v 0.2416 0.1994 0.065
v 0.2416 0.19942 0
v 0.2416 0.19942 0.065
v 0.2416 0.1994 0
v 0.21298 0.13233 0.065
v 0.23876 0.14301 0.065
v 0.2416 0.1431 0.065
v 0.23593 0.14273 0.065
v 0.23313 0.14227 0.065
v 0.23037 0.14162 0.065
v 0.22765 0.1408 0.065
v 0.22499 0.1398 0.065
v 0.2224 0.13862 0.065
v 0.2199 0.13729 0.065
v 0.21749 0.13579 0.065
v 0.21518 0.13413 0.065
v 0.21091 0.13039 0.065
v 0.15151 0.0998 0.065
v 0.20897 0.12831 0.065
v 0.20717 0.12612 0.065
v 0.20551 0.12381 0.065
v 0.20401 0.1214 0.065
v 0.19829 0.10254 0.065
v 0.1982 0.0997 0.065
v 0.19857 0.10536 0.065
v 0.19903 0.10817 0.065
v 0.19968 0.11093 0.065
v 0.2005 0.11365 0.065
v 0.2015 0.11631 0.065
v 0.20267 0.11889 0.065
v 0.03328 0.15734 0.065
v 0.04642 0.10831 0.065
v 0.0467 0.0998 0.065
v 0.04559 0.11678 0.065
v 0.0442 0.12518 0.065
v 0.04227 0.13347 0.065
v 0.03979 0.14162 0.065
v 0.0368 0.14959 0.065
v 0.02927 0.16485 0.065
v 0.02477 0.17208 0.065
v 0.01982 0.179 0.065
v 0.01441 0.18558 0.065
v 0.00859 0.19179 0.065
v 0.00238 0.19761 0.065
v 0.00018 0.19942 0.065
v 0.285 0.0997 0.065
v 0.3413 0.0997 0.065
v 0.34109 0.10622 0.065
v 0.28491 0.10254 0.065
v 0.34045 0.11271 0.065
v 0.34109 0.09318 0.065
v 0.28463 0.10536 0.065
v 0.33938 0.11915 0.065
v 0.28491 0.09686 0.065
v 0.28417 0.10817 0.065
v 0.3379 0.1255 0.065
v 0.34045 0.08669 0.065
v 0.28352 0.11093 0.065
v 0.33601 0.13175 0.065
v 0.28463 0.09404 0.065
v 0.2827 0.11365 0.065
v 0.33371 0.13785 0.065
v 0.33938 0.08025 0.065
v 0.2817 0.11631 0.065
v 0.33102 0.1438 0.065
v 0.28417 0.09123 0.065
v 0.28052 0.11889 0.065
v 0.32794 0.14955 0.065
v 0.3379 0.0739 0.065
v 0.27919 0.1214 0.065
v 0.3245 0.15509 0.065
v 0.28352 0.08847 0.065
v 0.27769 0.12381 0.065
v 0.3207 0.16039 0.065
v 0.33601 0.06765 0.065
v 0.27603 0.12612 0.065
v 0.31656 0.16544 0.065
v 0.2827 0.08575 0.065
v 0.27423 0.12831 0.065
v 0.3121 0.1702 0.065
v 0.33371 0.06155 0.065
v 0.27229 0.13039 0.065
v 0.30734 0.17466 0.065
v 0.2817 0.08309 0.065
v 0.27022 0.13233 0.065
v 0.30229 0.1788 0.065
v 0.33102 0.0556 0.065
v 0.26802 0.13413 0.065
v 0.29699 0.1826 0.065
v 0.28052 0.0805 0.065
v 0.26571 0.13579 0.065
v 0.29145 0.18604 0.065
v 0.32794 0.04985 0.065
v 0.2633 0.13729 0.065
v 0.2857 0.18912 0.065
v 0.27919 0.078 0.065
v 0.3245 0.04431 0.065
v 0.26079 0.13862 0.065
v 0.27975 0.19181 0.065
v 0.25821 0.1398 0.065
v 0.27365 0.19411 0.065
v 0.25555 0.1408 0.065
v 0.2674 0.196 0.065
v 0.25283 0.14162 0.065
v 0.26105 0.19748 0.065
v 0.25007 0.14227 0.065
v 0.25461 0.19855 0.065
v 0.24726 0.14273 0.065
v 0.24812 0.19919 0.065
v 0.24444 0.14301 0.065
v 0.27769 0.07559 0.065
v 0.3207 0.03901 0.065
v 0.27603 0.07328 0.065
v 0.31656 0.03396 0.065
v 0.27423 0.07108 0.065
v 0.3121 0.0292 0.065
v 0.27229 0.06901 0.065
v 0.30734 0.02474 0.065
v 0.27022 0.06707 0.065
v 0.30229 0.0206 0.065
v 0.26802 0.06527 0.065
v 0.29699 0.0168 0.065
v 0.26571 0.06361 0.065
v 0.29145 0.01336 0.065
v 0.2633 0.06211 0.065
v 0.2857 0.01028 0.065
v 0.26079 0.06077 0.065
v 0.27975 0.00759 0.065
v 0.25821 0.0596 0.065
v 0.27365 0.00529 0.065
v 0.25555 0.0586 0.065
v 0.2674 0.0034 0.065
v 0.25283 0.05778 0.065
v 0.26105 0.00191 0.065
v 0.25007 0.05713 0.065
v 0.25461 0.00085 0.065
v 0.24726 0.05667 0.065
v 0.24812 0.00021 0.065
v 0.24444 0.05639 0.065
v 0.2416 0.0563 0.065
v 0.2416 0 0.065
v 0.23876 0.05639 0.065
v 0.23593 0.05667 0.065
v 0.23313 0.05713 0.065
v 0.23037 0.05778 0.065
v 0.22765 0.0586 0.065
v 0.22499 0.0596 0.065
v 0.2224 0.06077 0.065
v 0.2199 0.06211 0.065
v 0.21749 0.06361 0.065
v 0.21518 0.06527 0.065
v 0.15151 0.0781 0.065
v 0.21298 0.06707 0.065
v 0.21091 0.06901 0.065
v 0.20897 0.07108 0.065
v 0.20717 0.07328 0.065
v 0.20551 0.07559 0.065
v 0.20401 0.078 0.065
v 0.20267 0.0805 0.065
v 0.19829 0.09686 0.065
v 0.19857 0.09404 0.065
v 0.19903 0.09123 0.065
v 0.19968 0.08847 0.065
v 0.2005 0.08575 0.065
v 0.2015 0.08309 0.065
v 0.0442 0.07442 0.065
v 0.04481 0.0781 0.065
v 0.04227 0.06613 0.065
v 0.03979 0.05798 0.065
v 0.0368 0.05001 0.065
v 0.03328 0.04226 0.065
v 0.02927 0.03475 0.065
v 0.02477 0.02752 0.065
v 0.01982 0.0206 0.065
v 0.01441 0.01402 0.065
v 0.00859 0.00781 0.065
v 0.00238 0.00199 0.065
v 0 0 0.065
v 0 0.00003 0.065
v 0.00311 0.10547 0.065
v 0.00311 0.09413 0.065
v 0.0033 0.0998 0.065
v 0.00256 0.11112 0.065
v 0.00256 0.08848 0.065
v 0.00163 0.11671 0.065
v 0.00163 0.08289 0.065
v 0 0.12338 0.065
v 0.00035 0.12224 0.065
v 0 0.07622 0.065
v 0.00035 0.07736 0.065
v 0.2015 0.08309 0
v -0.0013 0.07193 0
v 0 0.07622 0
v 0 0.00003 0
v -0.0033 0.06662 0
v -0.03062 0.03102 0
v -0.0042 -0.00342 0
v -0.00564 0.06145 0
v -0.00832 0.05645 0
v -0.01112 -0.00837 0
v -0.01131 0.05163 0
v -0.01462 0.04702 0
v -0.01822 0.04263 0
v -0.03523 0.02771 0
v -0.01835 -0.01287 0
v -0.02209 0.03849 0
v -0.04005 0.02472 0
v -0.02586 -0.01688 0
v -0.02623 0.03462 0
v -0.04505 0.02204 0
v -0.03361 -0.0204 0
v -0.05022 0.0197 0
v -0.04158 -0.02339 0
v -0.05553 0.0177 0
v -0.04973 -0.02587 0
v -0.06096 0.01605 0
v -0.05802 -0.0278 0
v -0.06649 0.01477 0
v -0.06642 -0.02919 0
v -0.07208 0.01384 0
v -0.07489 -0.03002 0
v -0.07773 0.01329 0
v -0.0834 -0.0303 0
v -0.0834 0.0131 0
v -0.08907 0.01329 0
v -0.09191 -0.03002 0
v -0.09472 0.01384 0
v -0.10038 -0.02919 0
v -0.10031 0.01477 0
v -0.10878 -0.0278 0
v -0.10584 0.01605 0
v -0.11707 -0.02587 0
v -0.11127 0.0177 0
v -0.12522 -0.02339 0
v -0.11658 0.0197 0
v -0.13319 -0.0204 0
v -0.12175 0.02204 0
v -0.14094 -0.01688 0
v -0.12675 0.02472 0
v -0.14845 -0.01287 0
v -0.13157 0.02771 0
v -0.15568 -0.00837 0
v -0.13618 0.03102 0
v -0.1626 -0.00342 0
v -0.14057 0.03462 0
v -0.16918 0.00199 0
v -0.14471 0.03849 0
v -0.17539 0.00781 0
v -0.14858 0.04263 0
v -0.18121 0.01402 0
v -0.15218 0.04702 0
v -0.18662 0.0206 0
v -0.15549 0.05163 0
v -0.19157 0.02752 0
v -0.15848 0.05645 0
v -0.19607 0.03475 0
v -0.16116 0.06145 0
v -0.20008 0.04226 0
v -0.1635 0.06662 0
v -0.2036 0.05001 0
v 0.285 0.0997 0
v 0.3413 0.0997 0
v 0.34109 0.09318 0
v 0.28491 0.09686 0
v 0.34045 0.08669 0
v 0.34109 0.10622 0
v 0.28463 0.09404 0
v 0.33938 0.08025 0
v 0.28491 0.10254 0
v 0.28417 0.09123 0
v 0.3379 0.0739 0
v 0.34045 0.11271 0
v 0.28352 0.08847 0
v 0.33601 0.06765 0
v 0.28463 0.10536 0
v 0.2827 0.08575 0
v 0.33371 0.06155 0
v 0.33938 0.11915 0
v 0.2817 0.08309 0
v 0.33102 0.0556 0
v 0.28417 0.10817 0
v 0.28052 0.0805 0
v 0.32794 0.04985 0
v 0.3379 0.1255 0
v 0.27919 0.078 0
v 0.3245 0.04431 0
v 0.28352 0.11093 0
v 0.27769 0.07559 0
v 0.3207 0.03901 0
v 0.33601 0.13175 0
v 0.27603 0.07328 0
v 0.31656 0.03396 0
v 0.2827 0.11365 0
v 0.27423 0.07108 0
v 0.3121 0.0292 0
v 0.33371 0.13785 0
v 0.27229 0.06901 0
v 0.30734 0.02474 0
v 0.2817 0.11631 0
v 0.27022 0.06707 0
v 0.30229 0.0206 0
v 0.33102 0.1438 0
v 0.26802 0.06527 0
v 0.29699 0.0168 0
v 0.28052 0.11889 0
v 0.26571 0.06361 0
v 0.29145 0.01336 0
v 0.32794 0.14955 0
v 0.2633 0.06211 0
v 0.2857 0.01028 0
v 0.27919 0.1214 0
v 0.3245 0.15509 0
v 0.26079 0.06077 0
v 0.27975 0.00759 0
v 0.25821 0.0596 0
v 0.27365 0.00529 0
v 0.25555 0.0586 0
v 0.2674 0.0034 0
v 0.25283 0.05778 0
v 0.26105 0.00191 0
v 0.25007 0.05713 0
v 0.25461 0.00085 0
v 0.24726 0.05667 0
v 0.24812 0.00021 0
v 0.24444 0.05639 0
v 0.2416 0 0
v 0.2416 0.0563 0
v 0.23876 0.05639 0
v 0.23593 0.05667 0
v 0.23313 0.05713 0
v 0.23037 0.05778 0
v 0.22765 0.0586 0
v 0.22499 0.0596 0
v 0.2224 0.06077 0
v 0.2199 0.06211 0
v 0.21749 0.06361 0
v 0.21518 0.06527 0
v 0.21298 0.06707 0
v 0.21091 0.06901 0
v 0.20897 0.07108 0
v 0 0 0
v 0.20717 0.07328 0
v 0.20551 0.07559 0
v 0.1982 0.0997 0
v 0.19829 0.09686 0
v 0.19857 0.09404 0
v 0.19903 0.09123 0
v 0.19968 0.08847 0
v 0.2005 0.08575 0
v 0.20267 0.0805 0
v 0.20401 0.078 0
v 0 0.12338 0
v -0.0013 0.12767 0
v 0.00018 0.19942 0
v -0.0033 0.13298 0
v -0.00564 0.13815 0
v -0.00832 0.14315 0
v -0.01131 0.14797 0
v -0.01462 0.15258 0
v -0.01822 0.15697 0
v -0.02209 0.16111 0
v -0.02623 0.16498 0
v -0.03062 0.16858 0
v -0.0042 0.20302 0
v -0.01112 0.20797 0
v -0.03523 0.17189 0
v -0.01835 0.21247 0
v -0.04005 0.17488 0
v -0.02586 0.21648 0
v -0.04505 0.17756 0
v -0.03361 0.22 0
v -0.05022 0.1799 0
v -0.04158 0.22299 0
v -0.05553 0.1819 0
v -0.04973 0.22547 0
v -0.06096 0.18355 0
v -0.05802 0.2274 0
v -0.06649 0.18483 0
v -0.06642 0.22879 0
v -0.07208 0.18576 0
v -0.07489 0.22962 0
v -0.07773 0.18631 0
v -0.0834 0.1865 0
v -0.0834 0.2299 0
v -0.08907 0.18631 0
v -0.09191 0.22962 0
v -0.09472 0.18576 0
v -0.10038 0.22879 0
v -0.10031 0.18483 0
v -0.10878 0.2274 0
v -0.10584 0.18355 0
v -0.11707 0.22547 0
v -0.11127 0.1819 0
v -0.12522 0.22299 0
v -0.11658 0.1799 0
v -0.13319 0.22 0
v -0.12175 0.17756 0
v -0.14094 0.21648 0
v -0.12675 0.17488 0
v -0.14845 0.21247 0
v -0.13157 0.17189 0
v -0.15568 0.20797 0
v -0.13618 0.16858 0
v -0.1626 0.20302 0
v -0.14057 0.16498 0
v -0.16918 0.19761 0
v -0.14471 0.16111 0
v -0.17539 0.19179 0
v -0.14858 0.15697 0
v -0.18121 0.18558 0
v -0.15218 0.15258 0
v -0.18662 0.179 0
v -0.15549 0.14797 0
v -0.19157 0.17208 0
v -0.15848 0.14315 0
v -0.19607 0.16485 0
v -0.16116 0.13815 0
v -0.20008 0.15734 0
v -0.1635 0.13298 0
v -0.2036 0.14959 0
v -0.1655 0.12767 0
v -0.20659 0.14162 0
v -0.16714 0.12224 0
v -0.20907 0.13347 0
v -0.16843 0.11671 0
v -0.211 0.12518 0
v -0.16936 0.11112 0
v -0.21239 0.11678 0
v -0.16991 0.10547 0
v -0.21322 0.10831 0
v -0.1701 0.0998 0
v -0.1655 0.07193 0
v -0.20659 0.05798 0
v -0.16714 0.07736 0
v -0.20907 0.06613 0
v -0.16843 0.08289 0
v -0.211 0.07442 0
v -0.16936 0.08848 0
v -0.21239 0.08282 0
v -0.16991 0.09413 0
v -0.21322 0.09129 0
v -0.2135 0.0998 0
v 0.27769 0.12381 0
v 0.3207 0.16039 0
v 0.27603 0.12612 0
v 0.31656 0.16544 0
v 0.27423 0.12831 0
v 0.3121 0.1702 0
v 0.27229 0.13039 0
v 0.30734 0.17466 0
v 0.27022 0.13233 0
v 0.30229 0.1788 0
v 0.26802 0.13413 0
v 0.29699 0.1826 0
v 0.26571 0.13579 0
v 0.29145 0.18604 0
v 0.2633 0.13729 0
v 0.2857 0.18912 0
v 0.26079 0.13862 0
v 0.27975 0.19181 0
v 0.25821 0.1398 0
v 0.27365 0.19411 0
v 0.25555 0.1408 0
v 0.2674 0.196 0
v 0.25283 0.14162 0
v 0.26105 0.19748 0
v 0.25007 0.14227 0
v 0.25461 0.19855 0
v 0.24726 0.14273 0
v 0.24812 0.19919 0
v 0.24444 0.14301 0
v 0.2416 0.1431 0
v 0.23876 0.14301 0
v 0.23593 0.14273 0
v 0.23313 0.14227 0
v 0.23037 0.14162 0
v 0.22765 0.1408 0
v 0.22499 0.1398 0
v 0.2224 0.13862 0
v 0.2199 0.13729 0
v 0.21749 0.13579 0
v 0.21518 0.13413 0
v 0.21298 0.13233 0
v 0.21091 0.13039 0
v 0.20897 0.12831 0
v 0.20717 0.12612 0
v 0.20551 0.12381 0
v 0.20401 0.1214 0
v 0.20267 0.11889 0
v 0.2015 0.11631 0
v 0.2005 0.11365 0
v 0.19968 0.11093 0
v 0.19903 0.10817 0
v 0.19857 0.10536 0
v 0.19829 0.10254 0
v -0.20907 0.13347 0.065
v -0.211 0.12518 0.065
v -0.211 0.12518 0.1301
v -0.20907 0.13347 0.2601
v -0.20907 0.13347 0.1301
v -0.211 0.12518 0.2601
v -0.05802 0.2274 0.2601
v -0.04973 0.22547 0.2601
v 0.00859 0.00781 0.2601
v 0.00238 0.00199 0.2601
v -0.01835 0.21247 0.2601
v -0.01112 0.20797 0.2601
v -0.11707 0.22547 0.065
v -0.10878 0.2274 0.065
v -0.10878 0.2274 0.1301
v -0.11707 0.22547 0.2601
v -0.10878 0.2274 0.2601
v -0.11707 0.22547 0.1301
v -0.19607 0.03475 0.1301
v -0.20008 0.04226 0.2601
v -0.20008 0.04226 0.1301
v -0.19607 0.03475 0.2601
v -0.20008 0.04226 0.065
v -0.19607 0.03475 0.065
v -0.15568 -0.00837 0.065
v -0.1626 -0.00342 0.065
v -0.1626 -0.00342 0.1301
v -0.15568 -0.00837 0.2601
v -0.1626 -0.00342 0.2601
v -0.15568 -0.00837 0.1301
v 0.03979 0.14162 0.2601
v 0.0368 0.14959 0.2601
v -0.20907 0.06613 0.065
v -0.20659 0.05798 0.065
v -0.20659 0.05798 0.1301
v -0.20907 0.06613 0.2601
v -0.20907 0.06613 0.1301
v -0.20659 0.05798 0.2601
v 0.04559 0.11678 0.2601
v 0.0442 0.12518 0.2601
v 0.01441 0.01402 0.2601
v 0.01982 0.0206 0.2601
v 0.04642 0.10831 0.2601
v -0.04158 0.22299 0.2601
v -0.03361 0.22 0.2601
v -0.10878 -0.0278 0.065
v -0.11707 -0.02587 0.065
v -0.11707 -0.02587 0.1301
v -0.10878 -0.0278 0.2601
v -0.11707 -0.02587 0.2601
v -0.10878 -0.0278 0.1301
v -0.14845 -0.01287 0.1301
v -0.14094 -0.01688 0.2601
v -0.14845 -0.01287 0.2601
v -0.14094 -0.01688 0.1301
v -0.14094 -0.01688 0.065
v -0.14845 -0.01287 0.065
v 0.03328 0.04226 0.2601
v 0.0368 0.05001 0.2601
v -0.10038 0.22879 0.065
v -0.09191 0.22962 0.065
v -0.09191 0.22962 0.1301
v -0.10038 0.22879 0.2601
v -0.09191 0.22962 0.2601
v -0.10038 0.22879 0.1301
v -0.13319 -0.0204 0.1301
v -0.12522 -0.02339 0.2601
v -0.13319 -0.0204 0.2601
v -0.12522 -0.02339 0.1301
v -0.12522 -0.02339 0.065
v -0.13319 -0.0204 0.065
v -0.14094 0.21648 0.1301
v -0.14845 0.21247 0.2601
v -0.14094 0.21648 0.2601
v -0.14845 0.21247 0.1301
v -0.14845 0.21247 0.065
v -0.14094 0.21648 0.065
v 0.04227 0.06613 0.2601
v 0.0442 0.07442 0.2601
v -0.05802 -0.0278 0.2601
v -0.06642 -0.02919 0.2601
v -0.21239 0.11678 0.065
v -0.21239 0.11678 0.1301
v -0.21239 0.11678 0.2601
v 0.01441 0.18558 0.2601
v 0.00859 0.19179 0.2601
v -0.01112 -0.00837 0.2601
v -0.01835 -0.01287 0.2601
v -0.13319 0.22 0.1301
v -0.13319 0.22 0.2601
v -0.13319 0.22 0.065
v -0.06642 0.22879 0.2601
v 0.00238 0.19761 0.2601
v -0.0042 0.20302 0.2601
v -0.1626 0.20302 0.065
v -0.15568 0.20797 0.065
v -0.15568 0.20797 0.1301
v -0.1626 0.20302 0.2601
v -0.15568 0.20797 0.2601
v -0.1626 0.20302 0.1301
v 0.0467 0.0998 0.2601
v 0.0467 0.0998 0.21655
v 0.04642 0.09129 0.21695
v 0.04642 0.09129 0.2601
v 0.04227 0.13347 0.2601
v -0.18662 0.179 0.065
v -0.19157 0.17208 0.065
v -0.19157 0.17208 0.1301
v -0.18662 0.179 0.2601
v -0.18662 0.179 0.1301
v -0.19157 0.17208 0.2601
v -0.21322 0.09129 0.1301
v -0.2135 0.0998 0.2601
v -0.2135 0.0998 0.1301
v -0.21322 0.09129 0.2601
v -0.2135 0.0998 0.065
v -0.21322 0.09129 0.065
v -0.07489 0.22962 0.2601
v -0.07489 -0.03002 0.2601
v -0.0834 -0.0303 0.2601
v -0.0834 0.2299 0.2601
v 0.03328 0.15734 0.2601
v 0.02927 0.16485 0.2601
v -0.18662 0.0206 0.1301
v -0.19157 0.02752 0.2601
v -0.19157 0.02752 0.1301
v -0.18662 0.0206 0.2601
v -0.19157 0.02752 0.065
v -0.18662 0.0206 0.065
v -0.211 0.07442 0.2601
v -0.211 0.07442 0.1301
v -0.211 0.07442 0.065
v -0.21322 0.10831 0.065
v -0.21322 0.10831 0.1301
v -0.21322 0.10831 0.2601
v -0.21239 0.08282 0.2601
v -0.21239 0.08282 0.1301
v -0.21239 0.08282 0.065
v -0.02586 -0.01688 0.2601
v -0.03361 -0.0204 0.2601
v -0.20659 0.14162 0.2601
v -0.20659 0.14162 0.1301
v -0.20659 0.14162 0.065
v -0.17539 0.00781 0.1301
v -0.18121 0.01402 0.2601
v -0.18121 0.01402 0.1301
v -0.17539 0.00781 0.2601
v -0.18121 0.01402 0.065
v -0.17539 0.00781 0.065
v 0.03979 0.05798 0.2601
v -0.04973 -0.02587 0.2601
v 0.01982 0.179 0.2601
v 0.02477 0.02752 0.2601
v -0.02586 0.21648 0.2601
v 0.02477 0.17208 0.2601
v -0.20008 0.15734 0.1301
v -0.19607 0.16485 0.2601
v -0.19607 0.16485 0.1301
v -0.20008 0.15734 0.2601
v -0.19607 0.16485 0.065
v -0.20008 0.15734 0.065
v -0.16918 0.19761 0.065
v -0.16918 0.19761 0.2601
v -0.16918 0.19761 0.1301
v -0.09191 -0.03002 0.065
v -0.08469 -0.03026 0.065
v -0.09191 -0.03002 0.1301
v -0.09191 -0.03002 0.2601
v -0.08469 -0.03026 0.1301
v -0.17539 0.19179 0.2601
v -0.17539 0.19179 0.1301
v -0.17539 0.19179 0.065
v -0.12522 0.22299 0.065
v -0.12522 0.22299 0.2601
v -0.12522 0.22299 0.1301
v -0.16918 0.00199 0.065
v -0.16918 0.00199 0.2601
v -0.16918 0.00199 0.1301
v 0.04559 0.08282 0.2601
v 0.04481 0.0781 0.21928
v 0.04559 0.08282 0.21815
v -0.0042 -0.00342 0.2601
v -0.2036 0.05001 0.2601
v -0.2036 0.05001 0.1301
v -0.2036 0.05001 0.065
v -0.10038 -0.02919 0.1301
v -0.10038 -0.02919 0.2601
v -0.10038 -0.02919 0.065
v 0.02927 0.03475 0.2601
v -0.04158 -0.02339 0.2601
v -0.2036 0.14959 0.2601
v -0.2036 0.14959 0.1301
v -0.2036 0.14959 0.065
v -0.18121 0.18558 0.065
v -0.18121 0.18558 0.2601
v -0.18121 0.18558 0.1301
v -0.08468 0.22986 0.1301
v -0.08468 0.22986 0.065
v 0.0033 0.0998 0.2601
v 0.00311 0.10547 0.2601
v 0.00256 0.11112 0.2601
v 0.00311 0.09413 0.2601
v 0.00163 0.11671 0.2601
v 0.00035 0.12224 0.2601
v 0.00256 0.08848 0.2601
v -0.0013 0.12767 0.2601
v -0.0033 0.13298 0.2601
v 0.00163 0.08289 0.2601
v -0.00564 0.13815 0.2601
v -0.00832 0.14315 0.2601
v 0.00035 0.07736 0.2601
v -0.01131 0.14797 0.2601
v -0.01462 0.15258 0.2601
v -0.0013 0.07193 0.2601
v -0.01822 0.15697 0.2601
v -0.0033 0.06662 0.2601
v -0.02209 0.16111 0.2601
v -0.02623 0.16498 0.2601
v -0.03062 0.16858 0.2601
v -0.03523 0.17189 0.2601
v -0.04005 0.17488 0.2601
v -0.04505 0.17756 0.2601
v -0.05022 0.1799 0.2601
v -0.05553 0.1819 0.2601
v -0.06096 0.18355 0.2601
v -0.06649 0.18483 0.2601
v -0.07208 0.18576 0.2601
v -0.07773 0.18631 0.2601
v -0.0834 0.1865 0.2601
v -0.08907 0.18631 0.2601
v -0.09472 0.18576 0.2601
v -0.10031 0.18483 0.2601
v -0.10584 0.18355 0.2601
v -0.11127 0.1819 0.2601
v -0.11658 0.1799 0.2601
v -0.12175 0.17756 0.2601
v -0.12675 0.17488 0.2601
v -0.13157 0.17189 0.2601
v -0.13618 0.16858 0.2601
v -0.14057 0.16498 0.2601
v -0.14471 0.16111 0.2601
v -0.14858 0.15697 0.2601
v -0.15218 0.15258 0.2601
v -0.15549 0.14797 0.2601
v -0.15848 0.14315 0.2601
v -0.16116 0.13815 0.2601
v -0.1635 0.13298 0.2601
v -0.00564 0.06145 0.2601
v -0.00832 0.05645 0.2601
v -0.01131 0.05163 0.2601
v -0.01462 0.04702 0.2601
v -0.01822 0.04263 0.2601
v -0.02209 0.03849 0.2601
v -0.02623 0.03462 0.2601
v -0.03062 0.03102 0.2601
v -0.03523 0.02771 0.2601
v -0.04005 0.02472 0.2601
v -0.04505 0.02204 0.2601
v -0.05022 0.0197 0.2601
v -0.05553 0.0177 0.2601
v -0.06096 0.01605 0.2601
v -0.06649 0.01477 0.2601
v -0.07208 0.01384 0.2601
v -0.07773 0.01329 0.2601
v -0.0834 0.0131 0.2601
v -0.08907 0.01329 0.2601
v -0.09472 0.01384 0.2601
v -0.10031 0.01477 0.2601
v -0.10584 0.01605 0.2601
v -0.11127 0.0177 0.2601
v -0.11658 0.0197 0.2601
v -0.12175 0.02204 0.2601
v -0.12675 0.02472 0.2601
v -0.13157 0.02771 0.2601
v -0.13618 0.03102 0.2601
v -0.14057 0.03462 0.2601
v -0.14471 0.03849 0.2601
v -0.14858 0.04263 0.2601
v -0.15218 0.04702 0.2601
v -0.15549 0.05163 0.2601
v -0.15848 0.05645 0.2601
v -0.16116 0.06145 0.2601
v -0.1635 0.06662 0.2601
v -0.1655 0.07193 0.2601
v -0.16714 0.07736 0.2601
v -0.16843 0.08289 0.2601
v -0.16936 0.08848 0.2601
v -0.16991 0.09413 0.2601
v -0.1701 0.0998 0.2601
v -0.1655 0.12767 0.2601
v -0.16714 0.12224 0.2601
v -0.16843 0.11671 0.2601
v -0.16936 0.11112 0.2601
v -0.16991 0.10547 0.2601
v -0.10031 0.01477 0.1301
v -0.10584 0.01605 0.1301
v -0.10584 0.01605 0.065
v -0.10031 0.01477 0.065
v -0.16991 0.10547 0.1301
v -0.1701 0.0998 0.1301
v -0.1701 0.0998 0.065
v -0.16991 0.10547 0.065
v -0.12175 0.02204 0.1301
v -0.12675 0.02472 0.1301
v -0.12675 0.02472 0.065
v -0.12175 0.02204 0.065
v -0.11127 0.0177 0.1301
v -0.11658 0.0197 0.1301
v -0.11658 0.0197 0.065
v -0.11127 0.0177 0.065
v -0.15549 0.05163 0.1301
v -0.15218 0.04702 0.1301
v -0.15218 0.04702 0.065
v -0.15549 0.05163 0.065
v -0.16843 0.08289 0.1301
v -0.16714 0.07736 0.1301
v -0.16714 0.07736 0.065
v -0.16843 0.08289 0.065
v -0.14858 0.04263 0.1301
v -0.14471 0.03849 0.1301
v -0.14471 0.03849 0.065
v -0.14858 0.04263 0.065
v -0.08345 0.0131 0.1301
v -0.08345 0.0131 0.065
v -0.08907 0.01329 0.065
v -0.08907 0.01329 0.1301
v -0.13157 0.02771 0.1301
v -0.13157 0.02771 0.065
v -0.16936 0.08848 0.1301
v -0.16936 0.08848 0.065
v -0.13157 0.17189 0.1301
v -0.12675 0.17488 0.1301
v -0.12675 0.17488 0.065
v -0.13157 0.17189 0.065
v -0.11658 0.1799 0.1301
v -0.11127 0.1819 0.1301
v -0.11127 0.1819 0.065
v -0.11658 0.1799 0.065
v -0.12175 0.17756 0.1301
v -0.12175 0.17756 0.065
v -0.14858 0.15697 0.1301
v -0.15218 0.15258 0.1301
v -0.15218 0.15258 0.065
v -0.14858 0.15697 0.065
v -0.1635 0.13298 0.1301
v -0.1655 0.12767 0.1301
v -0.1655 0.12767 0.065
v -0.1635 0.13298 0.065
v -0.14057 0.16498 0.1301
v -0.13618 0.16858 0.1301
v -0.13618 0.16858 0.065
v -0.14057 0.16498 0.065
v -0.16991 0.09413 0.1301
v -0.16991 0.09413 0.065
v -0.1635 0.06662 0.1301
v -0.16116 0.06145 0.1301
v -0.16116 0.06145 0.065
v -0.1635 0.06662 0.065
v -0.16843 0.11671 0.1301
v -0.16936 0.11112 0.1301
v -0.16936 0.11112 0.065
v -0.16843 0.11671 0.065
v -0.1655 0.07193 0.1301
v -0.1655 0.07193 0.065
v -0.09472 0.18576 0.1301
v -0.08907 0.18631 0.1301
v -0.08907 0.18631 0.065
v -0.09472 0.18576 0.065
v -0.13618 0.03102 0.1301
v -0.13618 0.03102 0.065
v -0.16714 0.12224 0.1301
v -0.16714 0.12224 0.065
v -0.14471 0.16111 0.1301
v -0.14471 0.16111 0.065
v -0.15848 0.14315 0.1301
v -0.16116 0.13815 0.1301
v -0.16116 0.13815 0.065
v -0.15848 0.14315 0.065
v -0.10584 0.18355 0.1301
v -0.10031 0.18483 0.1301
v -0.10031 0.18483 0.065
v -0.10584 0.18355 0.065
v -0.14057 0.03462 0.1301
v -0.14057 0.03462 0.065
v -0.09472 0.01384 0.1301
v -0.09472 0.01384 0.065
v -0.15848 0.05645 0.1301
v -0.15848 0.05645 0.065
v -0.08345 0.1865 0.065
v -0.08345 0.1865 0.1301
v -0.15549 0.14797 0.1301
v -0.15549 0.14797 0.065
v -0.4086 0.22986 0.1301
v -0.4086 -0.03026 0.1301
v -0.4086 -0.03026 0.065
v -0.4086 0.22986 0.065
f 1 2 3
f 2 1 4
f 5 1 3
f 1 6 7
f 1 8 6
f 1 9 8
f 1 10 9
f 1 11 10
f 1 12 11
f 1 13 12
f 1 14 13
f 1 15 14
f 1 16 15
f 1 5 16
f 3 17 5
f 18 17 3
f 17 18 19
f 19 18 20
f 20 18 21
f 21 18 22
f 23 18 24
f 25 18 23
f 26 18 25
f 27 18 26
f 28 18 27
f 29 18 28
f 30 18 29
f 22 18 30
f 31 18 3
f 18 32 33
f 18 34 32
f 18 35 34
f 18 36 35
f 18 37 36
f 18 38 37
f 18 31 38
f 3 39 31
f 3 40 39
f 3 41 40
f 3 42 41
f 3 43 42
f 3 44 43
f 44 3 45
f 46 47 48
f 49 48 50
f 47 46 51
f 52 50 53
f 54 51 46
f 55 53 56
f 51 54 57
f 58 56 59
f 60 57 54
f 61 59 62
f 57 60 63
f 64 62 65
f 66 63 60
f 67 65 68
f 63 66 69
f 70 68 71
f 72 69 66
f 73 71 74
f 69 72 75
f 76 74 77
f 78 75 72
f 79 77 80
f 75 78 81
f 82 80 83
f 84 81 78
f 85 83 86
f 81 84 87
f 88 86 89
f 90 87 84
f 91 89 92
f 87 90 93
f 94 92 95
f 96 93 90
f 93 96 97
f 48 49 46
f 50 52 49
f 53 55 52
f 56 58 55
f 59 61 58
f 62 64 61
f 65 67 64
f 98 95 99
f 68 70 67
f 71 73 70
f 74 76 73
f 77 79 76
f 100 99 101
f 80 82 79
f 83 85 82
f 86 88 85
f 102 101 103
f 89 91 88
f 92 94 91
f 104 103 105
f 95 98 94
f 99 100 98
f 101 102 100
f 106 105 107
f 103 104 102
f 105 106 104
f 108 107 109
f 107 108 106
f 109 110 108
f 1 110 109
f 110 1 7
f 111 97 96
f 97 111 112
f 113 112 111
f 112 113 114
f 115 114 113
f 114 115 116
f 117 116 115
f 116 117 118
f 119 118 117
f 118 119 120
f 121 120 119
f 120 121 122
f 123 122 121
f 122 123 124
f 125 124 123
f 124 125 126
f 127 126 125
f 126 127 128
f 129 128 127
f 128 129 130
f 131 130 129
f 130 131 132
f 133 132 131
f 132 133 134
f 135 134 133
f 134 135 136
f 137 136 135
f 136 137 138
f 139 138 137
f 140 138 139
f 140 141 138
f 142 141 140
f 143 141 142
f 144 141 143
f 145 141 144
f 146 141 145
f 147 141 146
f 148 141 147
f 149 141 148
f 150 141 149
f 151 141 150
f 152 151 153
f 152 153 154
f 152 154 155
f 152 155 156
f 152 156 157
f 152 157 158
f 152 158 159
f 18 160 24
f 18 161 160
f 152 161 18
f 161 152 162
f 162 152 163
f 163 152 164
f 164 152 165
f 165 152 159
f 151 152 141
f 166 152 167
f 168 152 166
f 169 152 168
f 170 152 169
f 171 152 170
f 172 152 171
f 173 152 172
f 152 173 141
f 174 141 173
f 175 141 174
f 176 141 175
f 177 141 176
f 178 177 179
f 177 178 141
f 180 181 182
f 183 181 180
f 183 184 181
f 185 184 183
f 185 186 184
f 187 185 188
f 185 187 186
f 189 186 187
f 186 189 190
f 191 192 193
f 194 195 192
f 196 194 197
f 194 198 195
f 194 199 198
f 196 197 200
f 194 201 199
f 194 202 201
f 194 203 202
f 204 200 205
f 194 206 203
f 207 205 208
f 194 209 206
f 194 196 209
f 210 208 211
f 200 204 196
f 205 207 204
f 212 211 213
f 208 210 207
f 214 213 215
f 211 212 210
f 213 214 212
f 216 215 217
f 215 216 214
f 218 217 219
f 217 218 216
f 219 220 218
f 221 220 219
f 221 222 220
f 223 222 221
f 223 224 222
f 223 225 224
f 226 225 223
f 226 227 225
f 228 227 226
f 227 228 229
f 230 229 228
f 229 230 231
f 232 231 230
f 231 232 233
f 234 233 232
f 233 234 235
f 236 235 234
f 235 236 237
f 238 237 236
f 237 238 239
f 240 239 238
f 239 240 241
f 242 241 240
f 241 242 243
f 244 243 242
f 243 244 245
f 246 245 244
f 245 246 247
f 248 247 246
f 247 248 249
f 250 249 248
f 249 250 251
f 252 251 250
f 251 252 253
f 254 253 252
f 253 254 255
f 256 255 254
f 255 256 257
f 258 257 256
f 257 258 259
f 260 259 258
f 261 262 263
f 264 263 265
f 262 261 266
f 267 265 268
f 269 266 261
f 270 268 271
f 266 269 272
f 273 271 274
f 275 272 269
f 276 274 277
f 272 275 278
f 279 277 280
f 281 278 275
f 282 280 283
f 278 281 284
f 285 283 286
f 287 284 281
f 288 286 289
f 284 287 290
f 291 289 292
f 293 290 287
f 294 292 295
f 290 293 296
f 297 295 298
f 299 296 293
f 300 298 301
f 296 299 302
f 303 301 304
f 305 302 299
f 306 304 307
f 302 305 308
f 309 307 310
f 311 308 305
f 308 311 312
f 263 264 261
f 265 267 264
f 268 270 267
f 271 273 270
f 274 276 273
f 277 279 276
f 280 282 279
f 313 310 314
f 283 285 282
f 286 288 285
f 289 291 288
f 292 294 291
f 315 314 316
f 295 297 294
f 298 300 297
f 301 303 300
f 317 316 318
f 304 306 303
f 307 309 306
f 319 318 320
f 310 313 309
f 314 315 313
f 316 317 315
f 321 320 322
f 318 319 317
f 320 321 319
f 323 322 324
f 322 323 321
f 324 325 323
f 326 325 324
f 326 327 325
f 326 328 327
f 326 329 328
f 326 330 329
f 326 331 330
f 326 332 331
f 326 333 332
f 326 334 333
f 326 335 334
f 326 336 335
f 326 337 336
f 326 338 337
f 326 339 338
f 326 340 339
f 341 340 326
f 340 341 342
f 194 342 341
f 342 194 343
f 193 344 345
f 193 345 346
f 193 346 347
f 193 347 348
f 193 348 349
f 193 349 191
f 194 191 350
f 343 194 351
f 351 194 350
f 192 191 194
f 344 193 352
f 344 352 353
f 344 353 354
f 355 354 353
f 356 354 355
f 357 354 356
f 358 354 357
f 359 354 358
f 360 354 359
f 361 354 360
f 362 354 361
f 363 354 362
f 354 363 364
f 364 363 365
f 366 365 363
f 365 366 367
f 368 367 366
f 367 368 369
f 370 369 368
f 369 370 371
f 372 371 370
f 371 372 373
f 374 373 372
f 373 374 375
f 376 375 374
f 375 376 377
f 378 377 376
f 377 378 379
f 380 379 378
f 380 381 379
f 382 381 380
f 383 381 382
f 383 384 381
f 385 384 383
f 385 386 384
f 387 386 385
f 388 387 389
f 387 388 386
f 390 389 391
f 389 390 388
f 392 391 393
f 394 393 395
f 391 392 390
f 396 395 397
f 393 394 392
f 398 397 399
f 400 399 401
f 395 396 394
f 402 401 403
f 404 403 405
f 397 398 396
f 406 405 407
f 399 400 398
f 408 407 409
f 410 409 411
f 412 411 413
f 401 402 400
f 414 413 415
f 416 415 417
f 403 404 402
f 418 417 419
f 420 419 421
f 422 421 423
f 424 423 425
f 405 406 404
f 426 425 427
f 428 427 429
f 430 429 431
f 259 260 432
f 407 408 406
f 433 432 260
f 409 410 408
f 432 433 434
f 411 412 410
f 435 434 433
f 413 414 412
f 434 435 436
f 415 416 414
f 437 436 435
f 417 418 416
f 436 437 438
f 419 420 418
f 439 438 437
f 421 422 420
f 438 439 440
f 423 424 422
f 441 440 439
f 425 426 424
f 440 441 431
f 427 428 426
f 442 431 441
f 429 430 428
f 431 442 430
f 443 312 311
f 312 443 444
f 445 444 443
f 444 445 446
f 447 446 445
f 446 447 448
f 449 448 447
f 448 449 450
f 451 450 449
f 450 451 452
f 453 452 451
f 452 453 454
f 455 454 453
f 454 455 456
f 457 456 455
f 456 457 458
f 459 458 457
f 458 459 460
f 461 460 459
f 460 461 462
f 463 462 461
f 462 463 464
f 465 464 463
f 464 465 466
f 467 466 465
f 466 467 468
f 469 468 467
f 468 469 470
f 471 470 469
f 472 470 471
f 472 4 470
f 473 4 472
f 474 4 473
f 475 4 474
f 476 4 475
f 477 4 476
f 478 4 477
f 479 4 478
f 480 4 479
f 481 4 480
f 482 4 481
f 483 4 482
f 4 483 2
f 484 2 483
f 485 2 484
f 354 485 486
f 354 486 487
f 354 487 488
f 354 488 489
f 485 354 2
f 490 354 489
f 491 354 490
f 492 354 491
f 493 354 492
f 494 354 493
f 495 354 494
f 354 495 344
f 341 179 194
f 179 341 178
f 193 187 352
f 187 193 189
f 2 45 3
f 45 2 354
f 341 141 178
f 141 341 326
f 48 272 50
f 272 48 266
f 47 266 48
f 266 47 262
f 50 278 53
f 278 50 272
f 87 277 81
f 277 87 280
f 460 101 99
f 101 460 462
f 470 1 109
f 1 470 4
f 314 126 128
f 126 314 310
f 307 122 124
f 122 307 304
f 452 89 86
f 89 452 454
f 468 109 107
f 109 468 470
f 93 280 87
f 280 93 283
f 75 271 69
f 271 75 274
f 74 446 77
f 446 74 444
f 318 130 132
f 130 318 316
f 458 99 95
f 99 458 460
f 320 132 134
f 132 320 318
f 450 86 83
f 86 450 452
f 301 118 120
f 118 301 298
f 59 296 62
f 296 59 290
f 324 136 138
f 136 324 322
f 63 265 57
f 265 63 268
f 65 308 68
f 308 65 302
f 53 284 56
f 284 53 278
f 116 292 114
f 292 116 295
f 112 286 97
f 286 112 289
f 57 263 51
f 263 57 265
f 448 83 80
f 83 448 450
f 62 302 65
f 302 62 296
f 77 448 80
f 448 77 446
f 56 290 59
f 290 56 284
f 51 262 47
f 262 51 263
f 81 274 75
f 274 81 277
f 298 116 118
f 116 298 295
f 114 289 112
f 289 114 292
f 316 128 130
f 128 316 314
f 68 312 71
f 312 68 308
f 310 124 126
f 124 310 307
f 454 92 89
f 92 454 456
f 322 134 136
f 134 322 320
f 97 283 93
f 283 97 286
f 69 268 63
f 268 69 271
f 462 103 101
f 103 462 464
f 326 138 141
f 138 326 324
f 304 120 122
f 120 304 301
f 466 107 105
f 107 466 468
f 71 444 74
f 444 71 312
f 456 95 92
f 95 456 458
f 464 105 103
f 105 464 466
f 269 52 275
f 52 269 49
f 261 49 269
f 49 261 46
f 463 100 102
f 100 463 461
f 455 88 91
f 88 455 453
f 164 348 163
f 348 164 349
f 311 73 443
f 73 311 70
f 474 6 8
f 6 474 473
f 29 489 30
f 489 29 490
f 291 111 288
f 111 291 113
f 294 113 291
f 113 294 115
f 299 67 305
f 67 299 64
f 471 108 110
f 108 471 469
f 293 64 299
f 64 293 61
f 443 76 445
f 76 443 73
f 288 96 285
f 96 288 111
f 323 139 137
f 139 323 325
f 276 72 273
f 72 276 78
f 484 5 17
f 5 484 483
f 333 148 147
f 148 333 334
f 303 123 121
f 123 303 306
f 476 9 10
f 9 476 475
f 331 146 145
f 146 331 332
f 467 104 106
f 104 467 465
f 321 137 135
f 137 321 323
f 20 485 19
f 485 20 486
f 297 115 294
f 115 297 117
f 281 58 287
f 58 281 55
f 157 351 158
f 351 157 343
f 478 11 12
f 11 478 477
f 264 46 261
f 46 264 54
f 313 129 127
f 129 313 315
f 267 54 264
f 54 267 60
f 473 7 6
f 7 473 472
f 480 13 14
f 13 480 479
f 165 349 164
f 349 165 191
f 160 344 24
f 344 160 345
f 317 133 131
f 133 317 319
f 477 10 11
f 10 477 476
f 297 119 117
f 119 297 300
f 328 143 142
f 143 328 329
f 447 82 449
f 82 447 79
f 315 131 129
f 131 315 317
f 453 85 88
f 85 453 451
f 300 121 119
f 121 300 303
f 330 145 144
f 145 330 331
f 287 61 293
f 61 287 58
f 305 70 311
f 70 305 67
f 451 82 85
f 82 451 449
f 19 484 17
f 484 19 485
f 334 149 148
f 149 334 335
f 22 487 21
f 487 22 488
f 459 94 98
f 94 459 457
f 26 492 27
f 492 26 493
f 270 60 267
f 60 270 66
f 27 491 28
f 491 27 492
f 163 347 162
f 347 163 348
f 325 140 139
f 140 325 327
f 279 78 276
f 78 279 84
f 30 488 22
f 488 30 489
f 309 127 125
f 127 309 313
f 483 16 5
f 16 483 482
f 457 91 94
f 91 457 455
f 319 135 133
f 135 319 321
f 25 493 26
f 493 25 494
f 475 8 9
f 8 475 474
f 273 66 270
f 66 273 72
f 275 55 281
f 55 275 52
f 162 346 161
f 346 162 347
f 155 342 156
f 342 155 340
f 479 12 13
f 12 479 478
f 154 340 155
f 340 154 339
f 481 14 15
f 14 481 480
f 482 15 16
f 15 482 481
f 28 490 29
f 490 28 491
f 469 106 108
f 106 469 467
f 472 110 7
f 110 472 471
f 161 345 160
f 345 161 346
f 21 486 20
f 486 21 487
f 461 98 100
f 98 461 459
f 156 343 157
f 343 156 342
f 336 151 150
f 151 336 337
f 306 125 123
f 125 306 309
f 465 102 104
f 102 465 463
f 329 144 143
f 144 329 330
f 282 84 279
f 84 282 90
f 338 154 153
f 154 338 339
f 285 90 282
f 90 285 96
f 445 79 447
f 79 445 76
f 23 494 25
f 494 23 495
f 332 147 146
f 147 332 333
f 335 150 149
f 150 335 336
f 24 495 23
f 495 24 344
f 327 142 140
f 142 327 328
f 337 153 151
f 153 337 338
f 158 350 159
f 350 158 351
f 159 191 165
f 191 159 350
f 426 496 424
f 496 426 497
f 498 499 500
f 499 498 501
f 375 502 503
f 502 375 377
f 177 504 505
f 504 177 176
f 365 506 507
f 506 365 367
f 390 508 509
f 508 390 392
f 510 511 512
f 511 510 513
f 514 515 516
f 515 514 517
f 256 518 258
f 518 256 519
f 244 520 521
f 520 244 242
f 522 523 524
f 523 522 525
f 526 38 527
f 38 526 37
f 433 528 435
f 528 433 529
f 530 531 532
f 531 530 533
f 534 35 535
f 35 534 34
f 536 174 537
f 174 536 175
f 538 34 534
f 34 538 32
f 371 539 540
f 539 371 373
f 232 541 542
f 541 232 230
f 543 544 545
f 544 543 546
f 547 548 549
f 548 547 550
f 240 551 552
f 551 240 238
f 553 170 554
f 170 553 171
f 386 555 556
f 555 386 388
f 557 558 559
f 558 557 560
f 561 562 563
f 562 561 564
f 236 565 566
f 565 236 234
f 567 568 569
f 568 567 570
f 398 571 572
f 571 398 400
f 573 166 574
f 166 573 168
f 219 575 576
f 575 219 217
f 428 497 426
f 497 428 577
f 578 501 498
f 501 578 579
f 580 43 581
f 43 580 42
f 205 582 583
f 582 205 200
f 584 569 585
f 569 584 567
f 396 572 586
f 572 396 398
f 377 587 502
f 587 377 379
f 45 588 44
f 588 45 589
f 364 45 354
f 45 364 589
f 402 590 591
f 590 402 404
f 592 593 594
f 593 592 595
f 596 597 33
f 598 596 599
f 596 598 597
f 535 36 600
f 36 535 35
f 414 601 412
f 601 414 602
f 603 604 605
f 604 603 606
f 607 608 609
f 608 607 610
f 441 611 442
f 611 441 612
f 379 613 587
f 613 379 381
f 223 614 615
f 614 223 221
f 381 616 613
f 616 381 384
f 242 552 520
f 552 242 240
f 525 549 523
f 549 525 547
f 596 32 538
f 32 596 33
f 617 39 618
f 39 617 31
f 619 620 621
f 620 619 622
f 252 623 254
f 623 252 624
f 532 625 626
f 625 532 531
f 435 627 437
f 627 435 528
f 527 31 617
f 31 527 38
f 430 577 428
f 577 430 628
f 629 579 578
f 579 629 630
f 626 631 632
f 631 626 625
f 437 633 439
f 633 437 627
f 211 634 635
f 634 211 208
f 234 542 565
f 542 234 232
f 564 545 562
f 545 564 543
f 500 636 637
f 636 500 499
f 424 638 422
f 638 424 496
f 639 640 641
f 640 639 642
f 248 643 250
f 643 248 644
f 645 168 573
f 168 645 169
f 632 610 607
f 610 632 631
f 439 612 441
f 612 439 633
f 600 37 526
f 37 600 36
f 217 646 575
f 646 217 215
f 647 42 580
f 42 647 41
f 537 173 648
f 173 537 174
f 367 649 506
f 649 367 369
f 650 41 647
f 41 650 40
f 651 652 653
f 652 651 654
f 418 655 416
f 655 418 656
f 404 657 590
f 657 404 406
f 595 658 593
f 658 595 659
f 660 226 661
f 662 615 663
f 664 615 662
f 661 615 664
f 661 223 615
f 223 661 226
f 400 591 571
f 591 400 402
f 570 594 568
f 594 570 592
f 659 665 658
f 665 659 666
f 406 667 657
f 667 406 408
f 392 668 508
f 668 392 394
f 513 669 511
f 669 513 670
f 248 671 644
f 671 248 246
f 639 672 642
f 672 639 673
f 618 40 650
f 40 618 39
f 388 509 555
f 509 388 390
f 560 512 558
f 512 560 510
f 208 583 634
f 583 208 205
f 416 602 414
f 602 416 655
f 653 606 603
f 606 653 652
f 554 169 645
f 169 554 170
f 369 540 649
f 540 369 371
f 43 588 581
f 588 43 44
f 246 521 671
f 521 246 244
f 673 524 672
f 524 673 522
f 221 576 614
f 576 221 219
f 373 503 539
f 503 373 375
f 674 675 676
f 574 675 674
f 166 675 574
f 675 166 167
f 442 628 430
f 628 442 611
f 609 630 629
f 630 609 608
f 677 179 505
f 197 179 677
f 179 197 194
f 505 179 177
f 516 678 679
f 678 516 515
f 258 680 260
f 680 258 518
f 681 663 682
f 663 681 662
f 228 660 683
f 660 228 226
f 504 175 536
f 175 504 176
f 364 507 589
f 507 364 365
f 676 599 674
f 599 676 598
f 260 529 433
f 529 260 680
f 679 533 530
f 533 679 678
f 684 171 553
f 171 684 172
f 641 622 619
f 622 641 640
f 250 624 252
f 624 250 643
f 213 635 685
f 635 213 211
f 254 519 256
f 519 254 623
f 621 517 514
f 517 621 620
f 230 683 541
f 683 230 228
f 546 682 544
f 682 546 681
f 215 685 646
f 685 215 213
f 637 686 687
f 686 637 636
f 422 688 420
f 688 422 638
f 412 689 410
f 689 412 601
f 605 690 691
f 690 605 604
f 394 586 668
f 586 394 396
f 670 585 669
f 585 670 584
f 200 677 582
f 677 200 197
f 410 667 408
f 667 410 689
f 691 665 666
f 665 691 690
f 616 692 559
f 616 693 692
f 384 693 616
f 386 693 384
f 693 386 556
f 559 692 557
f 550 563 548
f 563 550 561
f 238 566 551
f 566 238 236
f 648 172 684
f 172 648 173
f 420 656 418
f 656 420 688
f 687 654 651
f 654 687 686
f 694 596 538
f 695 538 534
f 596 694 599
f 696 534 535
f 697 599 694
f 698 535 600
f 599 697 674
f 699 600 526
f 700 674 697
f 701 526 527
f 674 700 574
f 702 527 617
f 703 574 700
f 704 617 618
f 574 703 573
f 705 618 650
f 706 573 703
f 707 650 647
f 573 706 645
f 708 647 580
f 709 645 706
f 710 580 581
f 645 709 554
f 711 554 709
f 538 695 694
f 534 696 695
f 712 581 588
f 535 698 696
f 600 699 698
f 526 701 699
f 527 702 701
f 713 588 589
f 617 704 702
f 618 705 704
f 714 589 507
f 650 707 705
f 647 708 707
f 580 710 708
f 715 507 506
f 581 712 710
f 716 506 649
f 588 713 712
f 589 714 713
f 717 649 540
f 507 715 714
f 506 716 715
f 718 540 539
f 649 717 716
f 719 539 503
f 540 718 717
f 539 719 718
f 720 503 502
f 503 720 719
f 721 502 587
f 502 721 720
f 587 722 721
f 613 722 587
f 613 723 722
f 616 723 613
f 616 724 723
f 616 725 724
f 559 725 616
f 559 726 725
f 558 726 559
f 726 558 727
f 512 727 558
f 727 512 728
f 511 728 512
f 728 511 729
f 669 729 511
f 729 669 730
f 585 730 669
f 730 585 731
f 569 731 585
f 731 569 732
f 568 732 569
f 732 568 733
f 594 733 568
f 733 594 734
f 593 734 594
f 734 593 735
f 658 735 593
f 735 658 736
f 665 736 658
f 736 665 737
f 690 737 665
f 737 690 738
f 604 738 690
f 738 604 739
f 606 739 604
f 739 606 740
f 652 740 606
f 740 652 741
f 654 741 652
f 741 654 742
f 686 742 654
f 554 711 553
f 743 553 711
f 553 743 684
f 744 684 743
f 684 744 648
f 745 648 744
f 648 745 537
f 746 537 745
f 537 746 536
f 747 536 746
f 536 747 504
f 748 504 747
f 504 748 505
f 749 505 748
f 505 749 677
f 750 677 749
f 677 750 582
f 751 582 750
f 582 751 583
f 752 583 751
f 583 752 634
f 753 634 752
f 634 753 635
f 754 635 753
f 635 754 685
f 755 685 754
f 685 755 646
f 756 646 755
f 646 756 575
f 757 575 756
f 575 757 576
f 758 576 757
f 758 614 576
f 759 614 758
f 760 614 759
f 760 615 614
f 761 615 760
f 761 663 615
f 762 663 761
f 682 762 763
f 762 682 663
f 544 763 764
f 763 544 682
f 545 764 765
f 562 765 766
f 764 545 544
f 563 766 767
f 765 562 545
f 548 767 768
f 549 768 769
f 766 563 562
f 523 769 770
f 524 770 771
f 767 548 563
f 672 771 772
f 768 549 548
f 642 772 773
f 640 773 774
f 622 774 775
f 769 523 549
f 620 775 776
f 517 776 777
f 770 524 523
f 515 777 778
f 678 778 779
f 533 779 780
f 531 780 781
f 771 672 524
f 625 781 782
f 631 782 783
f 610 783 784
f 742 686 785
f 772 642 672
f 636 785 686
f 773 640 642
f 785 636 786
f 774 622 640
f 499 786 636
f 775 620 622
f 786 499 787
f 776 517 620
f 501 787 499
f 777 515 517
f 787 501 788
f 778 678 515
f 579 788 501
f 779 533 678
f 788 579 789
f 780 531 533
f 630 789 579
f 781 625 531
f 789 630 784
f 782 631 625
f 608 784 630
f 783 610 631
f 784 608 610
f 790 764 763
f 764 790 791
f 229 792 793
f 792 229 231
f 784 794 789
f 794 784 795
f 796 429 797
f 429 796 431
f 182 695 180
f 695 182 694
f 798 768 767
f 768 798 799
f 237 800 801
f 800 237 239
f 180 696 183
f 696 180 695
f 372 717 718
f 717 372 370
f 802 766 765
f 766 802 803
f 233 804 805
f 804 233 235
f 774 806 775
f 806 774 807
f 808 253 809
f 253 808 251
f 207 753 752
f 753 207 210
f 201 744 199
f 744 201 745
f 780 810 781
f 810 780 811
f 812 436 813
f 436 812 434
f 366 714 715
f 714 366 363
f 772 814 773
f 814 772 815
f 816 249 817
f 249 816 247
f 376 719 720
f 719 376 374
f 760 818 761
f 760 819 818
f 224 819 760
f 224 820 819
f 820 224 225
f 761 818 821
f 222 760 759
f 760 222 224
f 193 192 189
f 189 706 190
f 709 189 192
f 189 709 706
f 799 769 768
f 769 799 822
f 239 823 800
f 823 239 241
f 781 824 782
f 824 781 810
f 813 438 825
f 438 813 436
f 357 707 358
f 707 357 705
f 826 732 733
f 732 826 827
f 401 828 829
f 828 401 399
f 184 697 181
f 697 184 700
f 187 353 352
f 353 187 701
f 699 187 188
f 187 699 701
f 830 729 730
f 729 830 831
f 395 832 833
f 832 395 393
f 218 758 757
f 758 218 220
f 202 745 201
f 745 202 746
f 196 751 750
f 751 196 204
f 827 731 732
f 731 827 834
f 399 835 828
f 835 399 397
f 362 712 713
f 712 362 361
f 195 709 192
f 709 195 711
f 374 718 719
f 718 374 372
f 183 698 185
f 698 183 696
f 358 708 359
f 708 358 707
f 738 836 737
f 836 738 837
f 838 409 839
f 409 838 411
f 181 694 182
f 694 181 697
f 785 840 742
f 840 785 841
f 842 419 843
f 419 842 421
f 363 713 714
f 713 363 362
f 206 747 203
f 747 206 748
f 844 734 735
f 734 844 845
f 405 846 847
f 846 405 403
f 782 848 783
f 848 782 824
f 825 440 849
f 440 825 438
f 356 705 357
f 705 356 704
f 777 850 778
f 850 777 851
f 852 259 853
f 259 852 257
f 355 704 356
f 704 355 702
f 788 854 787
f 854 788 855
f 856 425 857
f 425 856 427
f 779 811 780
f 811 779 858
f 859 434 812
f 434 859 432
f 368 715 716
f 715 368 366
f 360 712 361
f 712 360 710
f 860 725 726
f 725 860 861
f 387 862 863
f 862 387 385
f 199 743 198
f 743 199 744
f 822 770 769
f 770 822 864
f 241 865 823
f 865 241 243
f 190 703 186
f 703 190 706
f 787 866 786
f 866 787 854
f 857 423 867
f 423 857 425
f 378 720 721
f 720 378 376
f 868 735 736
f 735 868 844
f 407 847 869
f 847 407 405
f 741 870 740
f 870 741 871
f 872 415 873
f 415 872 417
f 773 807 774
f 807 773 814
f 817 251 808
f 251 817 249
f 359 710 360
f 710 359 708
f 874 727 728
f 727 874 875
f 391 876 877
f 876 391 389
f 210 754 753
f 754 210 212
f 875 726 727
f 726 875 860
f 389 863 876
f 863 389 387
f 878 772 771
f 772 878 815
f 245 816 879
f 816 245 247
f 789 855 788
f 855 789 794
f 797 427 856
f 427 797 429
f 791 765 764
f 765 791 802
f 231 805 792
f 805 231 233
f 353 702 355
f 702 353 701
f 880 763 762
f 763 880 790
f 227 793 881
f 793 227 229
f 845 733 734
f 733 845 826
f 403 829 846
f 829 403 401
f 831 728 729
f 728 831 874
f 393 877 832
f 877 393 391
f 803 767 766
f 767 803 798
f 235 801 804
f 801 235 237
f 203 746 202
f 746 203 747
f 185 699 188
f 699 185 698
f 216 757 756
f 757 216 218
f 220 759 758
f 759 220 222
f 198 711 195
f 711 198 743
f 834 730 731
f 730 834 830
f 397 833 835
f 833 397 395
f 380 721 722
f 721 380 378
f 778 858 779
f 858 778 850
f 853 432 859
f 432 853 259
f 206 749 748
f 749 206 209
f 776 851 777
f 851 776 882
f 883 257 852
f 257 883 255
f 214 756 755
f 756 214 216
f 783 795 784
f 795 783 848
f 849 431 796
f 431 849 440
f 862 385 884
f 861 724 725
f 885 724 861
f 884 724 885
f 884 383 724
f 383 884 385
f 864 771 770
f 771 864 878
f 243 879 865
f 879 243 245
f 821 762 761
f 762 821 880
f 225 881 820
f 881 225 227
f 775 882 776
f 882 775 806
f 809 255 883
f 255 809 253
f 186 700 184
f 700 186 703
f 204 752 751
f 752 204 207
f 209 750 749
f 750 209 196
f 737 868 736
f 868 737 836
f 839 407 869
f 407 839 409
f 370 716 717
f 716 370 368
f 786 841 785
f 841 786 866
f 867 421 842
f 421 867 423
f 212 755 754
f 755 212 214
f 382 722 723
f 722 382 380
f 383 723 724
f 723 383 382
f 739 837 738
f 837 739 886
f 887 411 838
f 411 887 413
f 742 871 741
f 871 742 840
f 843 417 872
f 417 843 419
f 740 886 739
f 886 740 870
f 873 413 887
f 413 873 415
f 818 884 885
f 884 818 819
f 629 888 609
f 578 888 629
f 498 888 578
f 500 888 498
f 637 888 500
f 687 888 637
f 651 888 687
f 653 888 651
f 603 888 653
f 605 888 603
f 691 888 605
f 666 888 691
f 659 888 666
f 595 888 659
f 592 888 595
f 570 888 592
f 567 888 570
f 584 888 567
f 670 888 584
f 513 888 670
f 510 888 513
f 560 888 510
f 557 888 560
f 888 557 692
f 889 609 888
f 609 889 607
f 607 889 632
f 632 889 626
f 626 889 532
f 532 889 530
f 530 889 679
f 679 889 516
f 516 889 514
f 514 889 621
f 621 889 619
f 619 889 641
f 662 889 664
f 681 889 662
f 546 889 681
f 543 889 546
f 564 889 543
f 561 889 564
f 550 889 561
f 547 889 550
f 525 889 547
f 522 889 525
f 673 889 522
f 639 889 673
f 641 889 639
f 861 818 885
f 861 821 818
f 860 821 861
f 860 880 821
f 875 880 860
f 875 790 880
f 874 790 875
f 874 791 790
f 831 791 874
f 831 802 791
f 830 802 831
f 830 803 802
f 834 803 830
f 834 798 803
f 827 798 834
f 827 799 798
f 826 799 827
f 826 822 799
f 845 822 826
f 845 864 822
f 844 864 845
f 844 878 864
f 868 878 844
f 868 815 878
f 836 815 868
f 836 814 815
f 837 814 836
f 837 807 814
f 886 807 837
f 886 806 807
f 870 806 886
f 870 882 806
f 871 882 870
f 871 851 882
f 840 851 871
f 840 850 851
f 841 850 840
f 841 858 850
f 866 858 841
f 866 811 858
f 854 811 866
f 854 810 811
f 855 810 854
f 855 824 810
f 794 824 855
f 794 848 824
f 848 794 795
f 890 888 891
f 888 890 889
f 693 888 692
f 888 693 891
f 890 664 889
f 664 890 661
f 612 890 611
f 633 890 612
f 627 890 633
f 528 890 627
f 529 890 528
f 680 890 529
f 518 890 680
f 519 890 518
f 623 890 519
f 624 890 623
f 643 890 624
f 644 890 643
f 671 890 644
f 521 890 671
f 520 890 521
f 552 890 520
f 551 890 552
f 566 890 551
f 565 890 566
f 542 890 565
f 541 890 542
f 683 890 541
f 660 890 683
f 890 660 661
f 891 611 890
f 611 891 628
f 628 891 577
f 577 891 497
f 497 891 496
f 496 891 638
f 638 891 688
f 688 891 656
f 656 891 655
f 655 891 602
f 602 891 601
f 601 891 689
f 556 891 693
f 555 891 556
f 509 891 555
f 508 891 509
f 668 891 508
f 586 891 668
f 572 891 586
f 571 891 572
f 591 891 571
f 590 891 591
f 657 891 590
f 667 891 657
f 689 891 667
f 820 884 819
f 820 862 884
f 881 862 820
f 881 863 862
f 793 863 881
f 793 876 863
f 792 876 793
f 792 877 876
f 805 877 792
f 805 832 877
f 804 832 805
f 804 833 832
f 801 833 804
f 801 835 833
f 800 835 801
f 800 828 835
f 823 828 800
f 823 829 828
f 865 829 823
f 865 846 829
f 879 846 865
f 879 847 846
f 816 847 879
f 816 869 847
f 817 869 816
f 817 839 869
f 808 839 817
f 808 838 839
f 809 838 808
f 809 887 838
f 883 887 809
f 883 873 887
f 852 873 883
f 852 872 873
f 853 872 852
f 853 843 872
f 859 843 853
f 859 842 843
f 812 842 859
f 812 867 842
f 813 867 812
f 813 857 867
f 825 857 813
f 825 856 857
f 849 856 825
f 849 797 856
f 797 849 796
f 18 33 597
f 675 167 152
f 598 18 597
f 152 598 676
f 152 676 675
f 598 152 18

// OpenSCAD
// ============================================================
// Lever link: base with rounded annular end, tall hollow
// sleeve, raised stepped arm and triangular gusset web
// Datum: base left-front-bottom corner (X right, Y back, Z up)
// ============================================================

// ---------------- Parameters ----------------
// Main base plate
base_len = 0.341352;          // overall length (X)
base_wid = 0.199422;          // overall width  (Y)
base_h   = 0.065;             // extrusion depth (Z)

// Low rounded annular section (rounded right end of base)
boss_cx  = 0.2416;            // centre from base left edge
boss_cy  = 0.0997;            // centre from base front edge
boss_ro  = 0.0997;            // outer radius
boss_ri  = 0.0434;            // inner radius, open through base

// Tall hollow sleeve (concentric annular cylinder)
slv_cx   = -0.0834;           // centre X from base left datum
slv_cy   = 0.0998;            // centre Y from base front datum
slv_ro   = 0.1301;            // outer radius (0.2602 span)
slv_ri   = 0.0867;            // bore radius
slv_top  = 0.2601;            // top reach from base datum

// Projecting straight-sided arm
arm_len  = 0.325145;          // length (X)
arm_wid  = 0.260116;          // width  (Y)
arm_top  = 0.1301;            // top height from base datum
arm_x0   = -0.4086;           // left edge offset
arm_cy   = slv_cy;            // centred on sleeve centreline
band_h   = 0.065;             // lower band cut from underside

// Triangular web (gusset rising toward the sleeve tier)
web_run  = 0.108382;          // plan run (X)
web_th   = 0.0217;            // material thickness (Y)
web_rise = 0.195087;          // vertical rise of side profile
web_x0   = 0.0466;            // start at sleeve surface
web_y0   = 0.0781;            // front offset of web face
web_emb  = 0.030;             // embed into sleeve wall
web_zemb = 0.005;             // embed into base top

eps = 0.002;                  // boolean overlap allowance
$fn = 96;                     // curve resolution

// Derived values
arm_x1  = arm_x0 + arm_len;           // right edge (~ sleeve centre)
web_z0  = base_h - web_zemb;          // web root just below base top
web_top = base_h + web_rise;          // ~ 0.2601 sleeve tier

// ---------------- Modules ----------------
// Base: rectangular body + rounded annular end, bore open through
module base_plate() {
    difference() {
        union() {
            cube([boss_cx, base_wid, base_h]);            // straight portion
            translate([boss_cx, boss_cy, 0])
                cylinder(h = base_h, r = boss_ro);        // rounded end
        }
        translate([boss_cx, boss_cy, -eps])
            cylinder(h = base_h + 2*eps, r = boss_ri);    // through hole
    }
}

// Tall hollow sleeve: annular cylinder from datum to slv_top
module sleeve() {
    translate([slv_cx, slv_cy, 0])
        difference() {
            cylinder(h = slv_top, r = slv_ro);
            translate([0, 0, -eps])
                cylinder(h = slv_top + 2*eps, r = slv_ri); // open bore
        }
}

// Arm: full-depth blank with lower band cut away -> raised stepped tier
module arm() {
    difference() {
        translate([arm_x0, arm_cy - arm_wid/2, 0])
            cube([arm_len, arm_wid, arm_top]);            // blank 0..arm_top
        translate([arm_x0 - eps, arm_cy - arm_wid/2 - eps, -eps])
            cube([arm_len + 2*eps, arm_wid + 2*eps, band_h + eps]); // band cut
    }
}

// Triangular web: XZ side profile extruded across its thickness
module web() {
    x0 = web_x0 - web_emb;                                // embedded root
    translate([0, web_y0 + web_th, 0])
        rotate([90, 0, 0])                                // stand profile upright
            linear_extrude(height = web_th)
                polygon(points = [
                    [x0,               web_z0 ],          // root at base
                    [x0,               web_top],          // high end at sleeve
                    [web_x0 + web_run, web_z0 ]           // tapered tip
                ]);
}

// ---------------- Assembly ----------------
union() {
    base_plate();
    sleeve();
    arm();
    web();
}
